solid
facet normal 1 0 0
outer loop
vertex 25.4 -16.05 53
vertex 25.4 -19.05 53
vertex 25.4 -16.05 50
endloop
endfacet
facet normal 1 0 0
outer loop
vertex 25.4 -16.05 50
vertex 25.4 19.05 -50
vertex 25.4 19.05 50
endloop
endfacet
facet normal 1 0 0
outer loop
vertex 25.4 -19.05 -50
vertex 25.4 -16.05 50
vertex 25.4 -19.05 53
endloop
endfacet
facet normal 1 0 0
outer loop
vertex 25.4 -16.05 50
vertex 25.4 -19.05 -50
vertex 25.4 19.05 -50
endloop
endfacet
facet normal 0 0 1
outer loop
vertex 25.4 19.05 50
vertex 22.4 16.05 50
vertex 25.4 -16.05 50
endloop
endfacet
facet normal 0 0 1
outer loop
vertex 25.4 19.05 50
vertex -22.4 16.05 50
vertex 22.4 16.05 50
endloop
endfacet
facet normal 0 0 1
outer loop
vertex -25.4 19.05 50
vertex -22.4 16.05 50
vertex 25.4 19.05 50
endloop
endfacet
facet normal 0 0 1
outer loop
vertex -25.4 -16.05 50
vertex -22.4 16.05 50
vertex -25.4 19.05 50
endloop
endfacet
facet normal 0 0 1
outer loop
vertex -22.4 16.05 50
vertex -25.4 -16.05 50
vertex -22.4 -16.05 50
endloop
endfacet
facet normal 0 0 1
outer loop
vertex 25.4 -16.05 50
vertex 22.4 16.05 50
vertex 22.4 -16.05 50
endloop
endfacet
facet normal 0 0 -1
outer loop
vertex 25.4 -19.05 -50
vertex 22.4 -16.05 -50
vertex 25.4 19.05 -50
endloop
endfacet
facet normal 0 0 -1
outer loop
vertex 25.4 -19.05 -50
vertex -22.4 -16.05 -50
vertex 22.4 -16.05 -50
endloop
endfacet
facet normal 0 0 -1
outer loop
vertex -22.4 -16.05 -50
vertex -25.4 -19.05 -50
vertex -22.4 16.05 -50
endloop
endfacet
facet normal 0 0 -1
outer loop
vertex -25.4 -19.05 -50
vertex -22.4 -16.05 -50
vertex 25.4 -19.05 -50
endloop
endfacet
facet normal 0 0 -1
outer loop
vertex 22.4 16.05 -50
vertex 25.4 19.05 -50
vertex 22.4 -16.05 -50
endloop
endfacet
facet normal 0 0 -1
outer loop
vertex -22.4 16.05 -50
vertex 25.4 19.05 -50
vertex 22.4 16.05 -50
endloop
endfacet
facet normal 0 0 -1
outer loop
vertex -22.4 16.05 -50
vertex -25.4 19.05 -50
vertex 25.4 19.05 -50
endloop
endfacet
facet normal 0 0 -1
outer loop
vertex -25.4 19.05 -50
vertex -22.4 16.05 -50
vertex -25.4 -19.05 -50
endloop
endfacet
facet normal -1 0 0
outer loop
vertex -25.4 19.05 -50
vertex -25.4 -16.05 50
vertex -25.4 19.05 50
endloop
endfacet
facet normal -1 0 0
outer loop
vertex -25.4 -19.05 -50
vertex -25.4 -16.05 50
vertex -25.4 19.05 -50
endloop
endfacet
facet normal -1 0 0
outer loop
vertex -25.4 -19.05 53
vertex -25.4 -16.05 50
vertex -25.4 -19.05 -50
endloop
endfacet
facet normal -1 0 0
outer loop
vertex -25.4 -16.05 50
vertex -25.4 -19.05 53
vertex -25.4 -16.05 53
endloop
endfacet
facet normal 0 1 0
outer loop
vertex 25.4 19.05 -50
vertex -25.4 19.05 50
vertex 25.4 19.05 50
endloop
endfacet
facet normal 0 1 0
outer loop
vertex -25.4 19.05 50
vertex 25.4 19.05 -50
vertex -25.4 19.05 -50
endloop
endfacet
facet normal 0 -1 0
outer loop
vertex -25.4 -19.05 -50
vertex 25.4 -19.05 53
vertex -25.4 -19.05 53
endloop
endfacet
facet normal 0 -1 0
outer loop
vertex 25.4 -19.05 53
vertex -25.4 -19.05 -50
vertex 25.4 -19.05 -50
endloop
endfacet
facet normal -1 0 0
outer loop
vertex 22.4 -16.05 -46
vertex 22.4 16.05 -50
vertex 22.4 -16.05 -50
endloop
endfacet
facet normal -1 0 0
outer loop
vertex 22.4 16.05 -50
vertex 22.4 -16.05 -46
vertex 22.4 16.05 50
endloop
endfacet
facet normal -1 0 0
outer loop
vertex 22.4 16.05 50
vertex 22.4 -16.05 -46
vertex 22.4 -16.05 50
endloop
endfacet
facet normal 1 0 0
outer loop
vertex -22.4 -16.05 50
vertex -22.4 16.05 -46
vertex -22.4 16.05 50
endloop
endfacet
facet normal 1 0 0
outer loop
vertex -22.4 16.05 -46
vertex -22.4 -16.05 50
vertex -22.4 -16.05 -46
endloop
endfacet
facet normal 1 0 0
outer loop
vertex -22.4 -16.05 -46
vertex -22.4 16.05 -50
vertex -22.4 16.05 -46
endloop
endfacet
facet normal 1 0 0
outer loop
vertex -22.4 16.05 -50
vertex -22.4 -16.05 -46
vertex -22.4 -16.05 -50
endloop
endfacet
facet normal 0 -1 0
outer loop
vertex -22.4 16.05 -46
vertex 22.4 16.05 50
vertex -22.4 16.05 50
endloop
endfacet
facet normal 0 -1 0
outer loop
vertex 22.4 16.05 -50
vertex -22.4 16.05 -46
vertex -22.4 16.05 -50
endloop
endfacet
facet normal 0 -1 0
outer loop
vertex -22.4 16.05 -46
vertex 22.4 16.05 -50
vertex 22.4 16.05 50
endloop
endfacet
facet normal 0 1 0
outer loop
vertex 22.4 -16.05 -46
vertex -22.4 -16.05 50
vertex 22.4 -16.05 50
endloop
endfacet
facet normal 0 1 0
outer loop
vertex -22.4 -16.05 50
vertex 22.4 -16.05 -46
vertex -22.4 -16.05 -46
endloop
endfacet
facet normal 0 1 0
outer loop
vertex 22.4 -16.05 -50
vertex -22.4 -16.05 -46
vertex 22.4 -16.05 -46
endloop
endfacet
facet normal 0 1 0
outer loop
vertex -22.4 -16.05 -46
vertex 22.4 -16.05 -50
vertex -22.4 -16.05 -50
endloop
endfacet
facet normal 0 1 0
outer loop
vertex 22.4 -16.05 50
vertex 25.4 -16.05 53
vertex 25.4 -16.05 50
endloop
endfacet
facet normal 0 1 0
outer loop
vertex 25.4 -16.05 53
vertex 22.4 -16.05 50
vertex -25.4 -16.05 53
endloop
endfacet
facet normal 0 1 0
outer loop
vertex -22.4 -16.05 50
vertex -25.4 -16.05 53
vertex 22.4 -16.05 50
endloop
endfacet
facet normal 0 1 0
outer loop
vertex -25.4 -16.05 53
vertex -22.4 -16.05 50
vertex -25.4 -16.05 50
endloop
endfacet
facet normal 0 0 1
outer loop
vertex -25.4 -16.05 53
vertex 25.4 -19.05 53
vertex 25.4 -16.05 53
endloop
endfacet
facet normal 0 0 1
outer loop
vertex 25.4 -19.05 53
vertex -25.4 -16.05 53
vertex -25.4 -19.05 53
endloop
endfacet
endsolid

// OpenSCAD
// Parameters
outer_width = 50.8; //[25.4:101.6:0.1]
outer_height = 38.1; //[19.05:76.2:0.1]
wall_thickness = 3; //[1.5:6:0.1]
length = 100; //[50:200:1]

// Box Section - complete geometry
module box_section() {
  color("Silver") {
    difference() {
      // Outer box
      cube([outer_width, outer_height, length], center=true);
      // Inner void
      translate([0, 0, 0])
        cube([outer_width - 2*wall_thickness, outer_height - 2*wall_thickness, length], center=true);
    }
  }
}

// Box Corner Profile Section - complete geometry
module box_corner_profile_section() {
  color("DimGray") {
    // Corner profile
    translate([-outer_width/2, -outer_height/2, -length/2])
      cube([wall_thickness, wall_thickness, length]);
  }
}

// Box Bezel Section - complete geometry
module box_bezel_section() {
  color("Black") {
    // Bezel
    translate([-outer_width/2, -outer_height/2, length/2])
      cube([outer_width, wall_thickness, wall_thickness]);
  }
}

// Box Corner Profile Sections - complete geometry
module box_corner_profile_sections() {
  color("DimGray") {
    // Corner profiles
    translate([outer_width/2 - wall_thickness, -outer_height/2, -length/2])
      cube([wall_thickness, wall_thickness, length]);
    translate([-outer_width/2, outer_height/2 - wall_thickness, -length/2])
      cube([wall_thickness, wall_thickness, length]);
    translate([outer_width/2 - wall_thickness, outer_height/2 - wall_thickness, -length/2])
      cube([wall_thickness, wall_thickness, length]);
  }
}

// Box Shelf Bracket Section - complete geometry
module box_shelf_bracket_section() {
  color("Silver") {
    // L-shaped bracket
    difference() {
      union() {
        // Vertical plate
        translate([-outer_width/2, -outer_height/2, -length/2])
          cube([wall_thickness, outer_height, 4]);
        // Horizontal plate
        translate([-outer_width/2, -outer_height/2, -length/2])
          cube([outer_width, wall_thickness, 4]);
      }
      // Mounting holes
      translate([-outer_width/2 + wall_thickness/2, -outer_height/2 + wall_thickness/2, -length/2 + 2])
        cylinder(d=2, h=5, center=true, $fn=16);
      translate([outer_width/2 - wall_thickness/2, -outer_height/2 + wall_thickness/2, -length/2 + 2])
        cylinder(d=2, h=5, center=true, $fn=16);
    }
  }
}

// Assembly
module assembly() {
  box_section();
  box_corner_profile_section();
  box_bezel_section();
  box_corner_profile_sections();
  box_shelf_bracket_section();
}

assembly();
